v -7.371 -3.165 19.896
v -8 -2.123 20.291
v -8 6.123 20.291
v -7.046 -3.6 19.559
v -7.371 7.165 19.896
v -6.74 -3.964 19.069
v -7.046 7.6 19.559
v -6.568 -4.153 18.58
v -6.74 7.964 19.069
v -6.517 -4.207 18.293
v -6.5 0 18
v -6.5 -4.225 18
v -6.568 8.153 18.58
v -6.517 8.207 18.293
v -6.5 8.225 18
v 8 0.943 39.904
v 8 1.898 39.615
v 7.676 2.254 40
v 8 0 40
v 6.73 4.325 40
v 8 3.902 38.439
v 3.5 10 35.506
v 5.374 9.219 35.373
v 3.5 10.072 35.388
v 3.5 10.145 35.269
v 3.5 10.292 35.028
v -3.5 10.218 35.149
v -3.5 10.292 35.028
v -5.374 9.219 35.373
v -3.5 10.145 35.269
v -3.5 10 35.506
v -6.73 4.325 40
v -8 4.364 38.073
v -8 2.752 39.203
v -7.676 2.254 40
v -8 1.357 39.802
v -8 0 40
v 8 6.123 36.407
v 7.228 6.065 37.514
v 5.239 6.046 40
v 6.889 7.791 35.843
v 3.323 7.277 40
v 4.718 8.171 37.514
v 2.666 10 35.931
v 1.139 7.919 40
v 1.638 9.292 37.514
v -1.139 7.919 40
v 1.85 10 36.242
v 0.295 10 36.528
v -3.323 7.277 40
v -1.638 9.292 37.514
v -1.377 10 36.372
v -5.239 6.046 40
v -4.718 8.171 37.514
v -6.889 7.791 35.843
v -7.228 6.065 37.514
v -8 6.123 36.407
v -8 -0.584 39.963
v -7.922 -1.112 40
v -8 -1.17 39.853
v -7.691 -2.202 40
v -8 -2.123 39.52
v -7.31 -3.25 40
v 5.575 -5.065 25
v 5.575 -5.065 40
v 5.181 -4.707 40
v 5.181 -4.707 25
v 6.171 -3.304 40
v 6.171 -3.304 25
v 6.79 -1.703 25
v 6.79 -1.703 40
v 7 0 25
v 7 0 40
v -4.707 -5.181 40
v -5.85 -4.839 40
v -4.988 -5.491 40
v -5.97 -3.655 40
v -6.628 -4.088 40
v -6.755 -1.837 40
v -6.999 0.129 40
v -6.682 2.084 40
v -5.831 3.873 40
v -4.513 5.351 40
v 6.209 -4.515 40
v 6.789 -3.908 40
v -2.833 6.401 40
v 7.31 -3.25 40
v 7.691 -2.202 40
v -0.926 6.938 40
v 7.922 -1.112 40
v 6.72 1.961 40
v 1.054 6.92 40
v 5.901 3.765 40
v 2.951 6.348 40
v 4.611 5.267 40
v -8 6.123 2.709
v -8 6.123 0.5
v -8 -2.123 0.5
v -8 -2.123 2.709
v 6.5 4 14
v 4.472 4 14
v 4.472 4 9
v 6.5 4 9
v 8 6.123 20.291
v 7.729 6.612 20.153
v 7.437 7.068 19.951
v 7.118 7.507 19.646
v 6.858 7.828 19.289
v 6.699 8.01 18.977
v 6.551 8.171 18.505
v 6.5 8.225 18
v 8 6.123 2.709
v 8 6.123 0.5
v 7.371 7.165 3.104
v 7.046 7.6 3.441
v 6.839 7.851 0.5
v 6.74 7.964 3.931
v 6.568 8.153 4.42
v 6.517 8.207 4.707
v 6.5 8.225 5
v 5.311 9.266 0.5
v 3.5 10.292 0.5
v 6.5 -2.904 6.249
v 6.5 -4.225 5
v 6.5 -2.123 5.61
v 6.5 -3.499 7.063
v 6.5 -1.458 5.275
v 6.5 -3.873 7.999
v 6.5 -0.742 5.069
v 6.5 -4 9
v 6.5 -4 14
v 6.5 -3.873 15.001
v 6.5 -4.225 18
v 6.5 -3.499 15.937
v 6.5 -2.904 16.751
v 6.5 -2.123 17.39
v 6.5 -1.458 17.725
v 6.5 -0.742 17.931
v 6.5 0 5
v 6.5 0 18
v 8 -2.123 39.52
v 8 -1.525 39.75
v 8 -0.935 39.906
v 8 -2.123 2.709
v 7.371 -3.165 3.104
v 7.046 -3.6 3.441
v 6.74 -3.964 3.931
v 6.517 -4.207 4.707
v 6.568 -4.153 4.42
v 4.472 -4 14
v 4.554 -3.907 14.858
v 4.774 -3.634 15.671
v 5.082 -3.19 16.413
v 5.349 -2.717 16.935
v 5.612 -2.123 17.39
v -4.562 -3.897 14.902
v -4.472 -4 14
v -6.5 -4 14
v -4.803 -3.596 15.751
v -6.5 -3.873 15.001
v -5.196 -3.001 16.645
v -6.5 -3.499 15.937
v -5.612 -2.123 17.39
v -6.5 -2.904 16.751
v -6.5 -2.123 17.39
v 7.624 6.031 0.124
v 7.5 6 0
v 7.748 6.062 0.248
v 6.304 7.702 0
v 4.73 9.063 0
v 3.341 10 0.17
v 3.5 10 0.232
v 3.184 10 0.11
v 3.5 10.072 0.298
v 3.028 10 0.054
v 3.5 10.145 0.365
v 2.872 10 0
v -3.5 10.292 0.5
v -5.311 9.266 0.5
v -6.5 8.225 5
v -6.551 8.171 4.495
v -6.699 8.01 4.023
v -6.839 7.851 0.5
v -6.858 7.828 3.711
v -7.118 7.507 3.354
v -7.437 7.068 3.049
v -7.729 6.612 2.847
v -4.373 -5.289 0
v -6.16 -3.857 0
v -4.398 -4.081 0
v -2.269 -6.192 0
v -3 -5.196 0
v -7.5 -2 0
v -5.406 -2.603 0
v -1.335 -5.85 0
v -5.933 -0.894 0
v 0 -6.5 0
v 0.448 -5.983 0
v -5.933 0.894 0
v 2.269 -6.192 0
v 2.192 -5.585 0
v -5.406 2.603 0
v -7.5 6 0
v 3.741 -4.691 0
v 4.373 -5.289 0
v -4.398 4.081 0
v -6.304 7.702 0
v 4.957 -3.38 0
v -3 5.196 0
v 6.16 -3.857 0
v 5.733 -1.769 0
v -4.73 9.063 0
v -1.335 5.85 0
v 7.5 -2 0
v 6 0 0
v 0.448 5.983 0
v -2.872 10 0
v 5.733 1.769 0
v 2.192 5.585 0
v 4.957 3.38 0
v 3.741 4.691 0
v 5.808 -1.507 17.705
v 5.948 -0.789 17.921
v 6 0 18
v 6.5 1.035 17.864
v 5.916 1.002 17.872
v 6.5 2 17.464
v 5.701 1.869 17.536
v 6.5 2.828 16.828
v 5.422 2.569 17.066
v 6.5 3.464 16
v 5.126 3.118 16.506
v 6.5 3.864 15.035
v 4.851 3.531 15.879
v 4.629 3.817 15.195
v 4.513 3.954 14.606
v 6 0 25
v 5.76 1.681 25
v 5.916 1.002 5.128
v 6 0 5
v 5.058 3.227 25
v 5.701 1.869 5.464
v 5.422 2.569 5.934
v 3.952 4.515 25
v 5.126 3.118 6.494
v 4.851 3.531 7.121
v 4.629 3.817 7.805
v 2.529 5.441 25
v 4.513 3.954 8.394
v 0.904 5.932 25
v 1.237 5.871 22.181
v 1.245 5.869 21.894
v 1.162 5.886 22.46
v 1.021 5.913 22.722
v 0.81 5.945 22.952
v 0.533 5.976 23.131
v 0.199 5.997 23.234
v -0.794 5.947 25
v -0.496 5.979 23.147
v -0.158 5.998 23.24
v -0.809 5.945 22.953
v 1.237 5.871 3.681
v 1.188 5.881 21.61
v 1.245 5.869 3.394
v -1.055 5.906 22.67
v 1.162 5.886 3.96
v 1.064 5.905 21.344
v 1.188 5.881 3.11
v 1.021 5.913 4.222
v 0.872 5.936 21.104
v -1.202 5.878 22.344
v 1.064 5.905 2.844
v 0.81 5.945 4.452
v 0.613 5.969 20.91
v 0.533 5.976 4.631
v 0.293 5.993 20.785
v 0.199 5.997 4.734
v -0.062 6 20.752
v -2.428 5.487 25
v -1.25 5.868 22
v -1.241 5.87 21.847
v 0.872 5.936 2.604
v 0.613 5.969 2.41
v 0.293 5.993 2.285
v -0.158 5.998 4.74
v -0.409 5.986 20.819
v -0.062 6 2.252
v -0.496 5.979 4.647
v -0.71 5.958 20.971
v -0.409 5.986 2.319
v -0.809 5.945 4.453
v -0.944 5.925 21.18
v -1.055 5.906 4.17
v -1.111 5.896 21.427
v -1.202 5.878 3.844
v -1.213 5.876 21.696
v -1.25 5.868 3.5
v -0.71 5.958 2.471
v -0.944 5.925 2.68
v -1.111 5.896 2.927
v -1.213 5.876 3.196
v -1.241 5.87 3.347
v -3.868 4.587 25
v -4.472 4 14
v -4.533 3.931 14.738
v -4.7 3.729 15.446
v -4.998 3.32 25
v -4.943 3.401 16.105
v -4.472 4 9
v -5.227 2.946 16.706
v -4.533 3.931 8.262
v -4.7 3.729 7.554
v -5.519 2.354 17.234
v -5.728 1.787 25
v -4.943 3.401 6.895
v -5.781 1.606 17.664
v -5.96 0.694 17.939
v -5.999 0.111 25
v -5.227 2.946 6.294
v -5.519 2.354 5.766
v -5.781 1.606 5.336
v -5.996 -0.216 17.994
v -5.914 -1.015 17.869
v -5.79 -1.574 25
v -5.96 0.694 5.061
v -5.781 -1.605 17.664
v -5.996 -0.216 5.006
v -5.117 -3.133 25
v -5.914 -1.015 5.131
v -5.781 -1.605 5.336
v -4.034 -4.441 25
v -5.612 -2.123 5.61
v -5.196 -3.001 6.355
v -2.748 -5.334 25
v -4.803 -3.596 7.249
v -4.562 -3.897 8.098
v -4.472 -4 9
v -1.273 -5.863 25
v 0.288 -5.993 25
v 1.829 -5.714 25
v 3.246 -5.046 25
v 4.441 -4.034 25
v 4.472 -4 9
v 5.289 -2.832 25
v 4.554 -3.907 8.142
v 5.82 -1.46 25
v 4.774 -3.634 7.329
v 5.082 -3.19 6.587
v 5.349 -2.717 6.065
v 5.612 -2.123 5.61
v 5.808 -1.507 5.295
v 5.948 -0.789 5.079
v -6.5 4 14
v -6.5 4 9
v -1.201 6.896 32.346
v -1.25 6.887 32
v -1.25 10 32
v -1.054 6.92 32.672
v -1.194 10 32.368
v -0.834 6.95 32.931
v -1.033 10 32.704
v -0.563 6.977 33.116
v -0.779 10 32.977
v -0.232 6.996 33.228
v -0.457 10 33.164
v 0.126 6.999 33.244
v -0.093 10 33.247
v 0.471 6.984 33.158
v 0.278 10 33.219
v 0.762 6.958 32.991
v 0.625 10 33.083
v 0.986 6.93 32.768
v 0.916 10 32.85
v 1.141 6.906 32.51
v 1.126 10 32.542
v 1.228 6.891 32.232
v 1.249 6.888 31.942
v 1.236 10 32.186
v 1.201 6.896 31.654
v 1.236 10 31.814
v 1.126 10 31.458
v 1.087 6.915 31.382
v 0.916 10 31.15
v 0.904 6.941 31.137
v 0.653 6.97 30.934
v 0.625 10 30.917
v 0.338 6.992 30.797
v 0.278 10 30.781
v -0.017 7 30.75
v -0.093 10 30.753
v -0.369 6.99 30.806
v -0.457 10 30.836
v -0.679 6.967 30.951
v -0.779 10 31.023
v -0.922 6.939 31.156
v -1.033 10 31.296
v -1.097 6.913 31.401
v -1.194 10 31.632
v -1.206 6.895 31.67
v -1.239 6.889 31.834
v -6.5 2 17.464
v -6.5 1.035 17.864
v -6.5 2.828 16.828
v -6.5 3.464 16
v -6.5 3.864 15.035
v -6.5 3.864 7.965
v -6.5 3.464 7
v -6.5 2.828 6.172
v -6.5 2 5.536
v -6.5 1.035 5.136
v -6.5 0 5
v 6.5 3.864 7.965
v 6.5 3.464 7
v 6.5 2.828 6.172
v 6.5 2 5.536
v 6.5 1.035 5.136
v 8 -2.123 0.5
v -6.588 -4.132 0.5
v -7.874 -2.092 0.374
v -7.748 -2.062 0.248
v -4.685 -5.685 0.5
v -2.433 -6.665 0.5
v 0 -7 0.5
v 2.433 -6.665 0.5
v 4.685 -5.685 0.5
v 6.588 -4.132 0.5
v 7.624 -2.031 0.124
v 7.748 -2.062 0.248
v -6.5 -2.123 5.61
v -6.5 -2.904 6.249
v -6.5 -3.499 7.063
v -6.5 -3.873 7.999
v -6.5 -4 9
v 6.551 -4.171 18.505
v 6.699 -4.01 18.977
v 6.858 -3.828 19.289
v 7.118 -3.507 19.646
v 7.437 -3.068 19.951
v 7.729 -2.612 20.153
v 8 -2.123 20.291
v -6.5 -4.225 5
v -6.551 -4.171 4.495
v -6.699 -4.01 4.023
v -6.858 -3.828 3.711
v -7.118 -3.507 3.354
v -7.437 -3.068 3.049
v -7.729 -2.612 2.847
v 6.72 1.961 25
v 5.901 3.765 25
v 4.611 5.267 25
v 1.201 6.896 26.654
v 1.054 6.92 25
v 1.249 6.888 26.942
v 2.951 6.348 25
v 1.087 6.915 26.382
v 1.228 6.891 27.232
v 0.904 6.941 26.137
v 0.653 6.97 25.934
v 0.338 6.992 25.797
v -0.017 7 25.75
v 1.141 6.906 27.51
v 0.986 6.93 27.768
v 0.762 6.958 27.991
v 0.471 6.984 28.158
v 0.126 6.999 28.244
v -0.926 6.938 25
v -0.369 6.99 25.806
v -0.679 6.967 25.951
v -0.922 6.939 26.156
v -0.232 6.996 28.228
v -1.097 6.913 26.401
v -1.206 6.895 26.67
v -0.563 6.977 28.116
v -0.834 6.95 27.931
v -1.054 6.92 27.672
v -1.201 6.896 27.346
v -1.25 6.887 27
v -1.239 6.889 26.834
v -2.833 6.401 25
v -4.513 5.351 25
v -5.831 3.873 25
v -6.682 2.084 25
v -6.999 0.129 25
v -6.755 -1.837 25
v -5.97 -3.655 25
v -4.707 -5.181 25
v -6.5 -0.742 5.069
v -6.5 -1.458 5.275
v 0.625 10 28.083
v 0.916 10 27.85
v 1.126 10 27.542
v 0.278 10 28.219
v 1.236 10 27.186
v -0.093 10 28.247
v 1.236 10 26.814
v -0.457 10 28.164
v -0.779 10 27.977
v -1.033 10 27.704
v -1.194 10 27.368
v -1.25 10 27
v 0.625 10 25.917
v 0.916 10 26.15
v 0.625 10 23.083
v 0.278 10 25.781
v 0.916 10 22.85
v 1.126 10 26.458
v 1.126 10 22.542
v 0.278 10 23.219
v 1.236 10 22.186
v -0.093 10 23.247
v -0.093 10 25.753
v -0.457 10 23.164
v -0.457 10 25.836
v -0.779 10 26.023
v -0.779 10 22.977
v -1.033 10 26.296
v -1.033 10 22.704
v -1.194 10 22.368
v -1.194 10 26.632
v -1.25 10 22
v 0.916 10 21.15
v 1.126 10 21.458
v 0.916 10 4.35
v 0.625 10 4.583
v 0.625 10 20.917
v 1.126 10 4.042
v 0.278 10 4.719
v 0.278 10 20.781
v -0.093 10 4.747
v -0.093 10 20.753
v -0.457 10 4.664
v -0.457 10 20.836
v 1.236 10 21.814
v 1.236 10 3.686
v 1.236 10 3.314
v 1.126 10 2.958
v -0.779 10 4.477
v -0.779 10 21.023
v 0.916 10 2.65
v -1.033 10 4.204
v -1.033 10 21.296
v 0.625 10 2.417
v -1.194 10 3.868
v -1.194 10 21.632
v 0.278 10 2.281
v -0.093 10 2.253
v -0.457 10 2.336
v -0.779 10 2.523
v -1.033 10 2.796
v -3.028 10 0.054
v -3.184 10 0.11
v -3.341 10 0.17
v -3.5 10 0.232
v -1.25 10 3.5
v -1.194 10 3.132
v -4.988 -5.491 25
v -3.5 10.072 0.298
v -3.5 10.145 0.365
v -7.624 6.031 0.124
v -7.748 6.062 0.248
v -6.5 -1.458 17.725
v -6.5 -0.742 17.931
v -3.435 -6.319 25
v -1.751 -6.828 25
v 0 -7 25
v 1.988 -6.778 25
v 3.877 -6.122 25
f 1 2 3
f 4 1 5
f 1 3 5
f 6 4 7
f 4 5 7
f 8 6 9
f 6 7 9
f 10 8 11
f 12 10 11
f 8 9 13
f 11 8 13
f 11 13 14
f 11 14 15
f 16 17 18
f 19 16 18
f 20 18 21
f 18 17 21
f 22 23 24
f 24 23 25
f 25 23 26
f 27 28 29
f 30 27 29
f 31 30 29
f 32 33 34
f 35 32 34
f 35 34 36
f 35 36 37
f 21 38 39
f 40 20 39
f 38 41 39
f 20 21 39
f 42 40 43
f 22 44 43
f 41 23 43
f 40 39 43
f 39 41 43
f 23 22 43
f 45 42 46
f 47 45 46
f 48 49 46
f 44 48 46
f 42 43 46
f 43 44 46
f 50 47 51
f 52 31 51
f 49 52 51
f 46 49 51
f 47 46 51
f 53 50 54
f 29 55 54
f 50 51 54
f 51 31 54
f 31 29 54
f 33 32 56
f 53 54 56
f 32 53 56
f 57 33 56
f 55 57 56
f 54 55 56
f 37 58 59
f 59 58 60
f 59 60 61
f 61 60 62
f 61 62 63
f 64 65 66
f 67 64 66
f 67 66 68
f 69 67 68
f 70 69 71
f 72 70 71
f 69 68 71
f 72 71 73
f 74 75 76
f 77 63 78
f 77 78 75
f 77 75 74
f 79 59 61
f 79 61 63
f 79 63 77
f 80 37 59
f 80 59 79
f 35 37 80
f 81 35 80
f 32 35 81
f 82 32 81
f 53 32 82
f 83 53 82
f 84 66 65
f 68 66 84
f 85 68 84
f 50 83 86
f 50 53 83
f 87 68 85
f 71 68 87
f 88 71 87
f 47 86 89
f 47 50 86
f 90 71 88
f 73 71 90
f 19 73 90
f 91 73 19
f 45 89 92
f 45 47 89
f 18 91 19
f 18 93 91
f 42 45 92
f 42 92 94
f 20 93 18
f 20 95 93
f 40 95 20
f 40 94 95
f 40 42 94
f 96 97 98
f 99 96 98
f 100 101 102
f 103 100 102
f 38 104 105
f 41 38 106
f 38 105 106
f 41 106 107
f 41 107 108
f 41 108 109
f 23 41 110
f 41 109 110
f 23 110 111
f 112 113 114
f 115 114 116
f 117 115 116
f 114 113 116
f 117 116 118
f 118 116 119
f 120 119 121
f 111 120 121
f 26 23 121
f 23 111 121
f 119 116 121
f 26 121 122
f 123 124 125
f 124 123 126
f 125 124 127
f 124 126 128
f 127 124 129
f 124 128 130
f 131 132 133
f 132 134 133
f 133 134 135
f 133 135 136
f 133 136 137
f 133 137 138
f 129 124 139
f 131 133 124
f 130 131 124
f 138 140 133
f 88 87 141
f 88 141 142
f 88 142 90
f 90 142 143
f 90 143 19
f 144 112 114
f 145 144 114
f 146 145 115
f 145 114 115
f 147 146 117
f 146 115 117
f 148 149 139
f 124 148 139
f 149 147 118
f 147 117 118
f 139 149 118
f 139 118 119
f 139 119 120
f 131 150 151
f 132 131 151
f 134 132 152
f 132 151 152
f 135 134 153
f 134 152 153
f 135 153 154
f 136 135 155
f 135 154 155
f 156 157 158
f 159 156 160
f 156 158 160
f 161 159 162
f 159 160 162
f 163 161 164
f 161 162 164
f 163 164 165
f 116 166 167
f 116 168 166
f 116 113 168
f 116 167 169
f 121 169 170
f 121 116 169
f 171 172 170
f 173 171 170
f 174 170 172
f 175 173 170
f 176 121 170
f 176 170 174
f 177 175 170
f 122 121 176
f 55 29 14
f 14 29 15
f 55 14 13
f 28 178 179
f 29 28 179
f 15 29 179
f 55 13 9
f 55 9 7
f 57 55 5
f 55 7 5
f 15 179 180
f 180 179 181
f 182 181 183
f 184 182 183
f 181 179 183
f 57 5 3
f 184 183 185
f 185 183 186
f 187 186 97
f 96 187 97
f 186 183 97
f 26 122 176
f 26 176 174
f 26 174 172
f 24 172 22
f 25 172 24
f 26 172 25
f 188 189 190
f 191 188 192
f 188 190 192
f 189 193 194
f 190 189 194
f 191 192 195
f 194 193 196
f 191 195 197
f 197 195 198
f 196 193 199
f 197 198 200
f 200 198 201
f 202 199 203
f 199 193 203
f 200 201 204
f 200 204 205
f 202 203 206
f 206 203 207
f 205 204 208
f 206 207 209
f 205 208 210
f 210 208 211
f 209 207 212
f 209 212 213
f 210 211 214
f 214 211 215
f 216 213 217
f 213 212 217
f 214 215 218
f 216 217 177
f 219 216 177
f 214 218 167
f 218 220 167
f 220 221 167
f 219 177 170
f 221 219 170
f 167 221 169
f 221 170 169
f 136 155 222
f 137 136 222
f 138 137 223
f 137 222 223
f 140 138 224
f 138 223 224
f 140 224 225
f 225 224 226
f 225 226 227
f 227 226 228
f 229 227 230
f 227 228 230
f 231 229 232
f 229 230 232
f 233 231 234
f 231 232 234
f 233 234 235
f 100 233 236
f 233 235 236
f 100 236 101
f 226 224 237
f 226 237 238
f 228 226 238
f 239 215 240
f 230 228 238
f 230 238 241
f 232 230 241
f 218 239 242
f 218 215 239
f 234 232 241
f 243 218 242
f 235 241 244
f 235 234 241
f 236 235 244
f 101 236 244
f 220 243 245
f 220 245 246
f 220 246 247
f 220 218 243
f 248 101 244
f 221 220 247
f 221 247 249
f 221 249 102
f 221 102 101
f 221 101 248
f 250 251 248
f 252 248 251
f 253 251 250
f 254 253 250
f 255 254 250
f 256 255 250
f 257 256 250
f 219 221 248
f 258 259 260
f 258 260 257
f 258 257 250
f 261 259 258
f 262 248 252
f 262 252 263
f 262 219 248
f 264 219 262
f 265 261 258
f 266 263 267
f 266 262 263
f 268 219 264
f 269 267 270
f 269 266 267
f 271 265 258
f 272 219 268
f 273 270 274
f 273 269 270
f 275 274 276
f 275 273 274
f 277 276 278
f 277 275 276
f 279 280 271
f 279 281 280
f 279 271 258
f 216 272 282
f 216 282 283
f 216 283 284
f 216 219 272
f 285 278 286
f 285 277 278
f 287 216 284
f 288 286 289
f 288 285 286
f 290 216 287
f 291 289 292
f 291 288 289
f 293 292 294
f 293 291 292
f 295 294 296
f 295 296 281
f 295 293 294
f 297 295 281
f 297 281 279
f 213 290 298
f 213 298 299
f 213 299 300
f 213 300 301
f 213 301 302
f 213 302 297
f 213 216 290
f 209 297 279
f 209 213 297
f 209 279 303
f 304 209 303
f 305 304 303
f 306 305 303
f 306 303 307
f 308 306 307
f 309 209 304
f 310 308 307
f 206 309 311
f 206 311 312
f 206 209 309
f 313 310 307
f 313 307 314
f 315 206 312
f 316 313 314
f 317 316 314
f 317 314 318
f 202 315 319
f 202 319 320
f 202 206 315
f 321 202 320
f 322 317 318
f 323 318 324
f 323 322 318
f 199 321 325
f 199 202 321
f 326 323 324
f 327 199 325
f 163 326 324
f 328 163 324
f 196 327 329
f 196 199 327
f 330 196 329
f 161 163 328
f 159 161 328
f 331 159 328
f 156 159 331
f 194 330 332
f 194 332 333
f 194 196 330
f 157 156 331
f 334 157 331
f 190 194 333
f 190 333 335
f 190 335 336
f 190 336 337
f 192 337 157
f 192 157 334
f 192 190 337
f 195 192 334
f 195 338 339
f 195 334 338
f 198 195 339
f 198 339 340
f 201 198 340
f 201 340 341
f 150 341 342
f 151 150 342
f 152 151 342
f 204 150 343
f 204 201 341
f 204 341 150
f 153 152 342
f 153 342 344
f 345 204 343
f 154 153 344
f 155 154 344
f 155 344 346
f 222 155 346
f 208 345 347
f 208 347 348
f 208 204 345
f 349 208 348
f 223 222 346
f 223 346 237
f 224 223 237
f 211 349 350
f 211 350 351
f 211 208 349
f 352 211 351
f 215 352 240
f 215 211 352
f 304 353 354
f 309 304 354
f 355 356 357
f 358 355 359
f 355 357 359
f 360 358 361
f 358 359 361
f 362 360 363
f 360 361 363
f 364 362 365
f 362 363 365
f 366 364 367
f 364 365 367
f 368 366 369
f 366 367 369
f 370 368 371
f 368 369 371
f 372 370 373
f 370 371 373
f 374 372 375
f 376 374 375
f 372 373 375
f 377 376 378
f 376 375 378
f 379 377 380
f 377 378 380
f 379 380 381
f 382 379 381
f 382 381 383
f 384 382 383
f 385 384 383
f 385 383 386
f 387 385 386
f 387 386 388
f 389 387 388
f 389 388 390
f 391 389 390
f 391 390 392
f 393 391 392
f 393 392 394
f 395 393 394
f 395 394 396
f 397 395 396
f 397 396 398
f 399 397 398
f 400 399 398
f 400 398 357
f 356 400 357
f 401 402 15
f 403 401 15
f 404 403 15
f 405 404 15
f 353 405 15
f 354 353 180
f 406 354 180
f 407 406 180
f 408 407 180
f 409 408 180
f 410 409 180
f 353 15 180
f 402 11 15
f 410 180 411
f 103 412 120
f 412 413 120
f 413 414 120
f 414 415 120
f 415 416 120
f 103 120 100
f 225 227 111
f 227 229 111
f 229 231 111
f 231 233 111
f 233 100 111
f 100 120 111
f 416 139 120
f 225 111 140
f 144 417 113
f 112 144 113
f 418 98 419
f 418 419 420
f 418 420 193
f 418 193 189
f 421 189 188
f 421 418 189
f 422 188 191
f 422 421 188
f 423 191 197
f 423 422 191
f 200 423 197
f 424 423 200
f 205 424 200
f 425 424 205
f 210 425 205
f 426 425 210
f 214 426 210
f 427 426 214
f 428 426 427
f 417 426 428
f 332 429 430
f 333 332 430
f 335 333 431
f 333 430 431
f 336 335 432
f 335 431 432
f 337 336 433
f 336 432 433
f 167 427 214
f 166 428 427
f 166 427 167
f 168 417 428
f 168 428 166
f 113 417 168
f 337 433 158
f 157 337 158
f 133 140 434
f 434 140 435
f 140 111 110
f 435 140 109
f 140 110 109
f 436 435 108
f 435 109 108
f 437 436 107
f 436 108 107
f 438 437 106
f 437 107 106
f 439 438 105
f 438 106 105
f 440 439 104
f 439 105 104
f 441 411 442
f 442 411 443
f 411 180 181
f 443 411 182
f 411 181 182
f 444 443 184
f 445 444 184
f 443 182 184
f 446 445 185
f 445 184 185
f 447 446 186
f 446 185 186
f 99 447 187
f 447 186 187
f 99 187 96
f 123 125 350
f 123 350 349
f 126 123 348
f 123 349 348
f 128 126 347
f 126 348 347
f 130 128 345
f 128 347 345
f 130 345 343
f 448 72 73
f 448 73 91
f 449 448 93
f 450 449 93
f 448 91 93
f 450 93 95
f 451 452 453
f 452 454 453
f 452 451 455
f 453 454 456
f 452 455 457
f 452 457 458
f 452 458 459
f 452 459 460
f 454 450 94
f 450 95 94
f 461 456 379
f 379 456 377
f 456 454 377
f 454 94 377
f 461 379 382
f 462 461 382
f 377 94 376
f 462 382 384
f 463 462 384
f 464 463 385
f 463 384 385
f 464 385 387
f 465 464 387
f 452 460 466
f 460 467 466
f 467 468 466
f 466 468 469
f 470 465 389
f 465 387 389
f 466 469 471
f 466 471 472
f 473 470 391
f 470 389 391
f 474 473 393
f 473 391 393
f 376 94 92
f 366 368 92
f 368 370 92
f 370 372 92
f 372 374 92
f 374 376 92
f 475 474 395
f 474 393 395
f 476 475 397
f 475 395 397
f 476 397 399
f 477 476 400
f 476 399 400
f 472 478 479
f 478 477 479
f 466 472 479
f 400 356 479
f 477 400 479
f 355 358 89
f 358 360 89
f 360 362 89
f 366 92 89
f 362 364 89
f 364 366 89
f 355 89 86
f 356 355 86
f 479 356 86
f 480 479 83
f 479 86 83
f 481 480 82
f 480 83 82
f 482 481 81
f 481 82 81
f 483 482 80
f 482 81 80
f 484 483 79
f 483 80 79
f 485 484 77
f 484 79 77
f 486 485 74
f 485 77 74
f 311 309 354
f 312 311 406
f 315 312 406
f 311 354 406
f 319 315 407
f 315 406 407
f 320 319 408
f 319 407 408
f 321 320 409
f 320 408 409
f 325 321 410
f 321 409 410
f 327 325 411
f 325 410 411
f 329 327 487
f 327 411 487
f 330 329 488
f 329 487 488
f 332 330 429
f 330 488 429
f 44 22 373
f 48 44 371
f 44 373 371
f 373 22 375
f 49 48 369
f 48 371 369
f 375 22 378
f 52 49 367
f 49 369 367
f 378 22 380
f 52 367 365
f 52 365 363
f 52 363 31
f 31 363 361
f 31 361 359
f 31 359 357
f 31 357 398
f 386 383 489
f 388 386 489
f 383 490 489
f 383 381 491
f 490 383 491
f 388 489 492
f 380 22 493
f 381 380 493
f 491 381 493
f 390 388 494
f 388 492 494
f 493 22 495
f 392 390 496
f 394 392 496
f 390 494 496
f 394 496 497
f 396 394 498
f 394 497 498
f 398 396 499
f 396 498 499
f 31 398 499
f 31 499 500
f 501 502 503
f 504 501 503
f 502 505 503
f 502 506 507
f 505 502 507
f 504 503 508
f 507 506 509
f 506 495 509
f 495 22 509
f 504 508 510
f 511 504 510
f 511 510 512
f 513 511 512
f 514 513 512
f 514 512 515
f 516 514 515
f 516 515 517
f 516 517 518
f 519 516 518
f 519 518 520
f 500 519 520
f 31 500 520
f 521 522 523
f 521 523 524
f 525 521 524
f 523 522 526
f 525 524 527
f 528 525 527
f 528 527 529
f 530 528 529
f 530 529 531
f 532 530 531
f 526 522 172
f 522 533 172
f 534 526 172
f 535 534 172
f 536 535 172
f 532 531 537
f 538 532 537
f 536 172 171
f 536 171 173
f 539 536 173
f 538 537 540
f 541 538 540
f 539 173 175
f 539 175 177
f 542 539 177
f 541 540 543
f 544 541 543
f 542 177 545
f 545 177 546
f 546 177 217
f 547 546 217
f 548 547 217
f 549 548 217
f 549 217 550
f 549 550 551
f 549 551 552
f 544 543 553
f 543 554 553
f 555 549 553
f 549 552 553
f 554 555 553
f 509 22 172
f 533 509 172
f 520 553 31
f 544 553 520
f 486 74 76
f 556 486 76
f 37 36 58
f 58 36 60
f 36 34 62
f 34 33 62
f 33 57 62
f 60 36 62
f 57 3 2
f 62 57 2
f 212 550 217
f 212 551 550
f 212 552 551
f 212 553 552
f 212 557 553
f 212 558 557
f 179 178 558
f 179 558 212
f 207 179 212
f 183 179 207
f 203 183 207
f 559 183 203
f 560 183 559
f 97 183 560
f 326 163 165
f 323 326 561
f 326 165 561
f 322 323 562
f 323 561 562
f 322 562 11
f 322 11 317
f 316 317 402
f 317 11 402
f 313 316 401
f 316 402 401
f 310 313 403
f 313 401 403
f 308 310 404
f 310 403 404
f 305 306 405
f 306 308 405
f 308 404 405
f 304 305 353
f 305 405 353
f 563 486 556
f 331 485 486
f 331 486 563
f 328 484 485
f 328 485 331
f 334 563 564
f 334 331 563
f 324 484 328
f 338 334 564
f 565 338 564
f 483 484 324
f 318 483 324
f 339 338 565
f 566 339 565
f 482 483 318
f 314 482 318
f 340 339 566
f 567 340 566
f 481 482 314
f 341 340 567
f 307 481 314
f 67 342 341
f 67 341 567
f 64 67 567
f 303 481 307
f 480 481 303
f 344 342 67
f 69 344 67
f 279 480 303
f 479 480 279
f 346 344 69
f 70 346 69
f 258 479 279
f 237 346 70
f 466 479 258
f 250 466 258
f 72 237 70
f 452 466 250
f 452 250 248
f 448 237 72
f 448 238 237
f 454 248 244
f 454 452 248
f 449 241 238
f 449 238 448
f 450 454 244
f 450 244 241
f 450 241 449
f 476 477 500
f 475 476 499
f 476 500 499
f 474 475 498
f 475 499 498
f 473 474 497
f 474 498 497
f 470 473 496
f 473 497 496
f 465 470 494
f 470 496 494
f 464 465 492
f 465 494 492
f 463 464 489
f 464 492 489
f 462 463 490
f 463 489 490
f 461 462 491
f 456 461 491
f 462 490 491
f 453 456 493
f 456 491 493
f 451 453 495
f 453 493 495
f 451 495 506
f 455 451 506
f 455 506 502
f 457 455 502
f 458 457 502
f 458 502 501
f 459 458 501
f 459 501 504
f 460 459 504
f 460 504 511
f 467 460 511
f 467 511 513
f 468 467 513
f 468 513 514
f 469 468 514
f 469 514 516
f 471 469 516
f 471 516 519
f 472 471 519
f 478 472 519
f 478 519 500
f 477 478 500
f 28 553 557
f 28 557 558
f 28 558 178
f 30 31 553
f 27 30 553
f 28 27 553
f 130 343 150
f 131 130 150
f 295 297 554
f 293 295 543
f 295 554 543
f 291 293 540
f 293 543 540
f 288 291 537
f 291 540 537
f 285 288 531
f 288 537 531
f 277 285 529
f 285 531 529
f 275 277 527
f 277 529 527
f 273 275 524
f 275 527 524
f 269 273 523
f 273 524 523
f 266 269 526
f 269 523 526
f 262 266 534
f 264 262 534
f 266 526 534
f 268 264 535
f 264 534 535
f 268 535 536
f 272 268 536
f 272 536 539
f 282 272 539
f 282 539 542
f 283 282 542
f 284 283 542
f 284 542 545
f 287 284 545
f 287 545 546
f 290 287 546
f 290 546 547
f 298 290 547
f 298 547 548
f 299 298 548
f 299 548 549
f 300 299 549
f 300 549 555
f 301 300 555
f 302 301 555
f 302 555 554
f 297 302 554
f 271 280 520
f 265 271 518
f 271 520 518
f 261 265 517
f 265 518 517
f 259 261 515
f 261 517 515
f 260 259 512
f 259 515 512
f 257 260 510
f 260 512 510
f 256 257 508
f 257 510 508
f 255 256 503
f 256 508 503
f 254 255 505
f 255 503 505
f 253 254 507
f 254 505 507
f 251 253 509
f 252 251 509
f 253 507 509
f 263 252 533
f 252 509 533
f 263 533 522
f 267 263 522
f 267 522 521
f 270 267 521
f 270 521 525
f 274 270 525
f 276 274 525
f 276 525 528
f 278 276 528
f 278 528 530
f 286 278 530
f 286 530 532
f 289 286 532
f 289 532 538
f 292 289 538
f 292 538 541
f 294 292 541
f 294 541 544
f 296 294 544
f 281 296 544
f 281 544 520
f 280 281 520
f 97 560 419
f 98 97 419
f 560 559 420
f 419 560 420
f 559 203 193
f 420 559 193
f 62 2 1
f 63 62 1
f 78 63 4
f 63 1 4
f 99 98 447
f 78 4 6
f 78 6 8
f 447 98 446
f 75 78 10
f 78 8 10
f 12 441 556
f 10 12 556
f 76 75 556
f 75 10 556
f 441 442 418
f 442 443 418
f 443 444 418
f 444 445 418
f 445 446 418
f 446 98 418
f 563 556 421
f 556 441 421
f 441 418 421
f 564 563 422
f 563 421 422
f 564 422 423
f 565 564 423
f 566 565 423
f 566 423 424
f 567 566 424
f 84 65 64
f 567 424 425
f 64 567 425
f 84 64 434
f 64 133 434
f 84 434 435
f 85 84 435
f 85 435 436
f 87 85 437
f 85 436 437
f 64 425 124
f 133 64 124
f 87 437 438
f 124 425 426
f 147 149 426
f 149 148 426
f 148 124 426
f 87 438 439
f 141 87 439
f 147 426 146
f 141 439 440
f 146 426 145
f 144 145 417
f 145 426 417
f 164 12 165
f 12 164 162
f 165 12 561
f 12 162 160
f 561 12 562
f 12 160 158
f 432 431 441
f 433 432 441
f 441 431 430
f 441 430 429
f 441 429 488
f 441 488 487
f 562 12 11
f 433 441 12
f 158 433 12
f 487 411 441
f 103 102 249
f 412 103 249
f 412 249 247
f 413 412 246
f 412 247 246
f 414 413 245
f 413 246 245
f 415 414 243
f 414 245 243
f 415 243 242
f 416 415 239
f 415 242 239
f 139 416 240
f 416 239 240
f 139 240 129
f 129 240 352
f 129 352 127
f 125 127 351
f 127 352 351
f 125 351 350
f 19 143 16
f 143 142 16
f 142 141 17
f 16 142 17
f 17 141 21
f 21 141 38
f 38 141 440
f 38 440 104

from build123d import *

# Parameters (mm, degrees)
F0_R      = 6
F1_DEPTH  = 40
F3_DEPTH  = 15
F6_SIZE   = 0.5
F8_DEPTH  = 16.0010001
F9_R      = 1.25
F10_DEPTH = 4.1326528028
F11_DEPTH = 15


# Not quite as in the source:
# - a feature names something its author has since deleted; it is built from what else it names


with BuildPart() as f1:
    # F0 (on Top) → F1 (new body)
    with BuildSketch(Plane.XY):
        with BuildLine():
            Line((-8, 6.1231056256), (-8, -2.1231056256))
            ThreePointArc((-8, -2.1231056256), (0, -7), (8, -2.1231056256))
            Line((8, -2.1231056256), (8, 6.1231056256))
            ThreePointArc((8, 6.1231056256), (6.1160859286, 8.6025368544), (3.5, 10.2915619759))
            Line((3.5, 10.2915619759), (3.5, 10))
            Line((3.5, 10), (-3.5, 10))
            Line((-3.5, 10), (-3.5, 10.2915619759))
            ThreePointArc((-3.5, 10.2915619759), (-6.1160859286, 8.6025368544), (-8, 6.1231056256))
        make_face()
        Circle(F0_R, mode=Mode.SUBTRACT)
    extrude(amount=F1_DEPTH)

    # F2 (on face) → F3 (cut)
    with BuildSketch(Plane.XY.offset(40)):
        with BuildLine():
            ThreePointArc((5.1812656518, -4.7068552395), (6.5295045586, -2.5230081686), (7, 0))
            ThreePointArc((7, 0), (-2.8330207662, 6.4010931362), (-4.7068552395, -5.1812656518))
            Line((-4.7068552395, -5.1812656518), (-4.0344473482, -4.4410848444))
            ThreePointArc((-4.0344473482, -4.4410848444), (-2.4283035139, 5.4866512596), (6, 0))
            ThreePointArc((6, 0), (5.5967181931, -2.1625784302), (4.4410848444, -4.0344473482))
            Line((4.4410848444, -4.0344473482), (5.1812656518, -4.7068552395))
        make_face()
        with BuildLine():
            Line((-4.0344473482, -4.4410848444), (-4.7068552395, -5.1812656518))
            ThreePointArc((-4.7068552395, -5.1812656518), (-2.523008134, -6.529504572), (7.42e-08, -7))
            ThreePointArc((7.42e-08, -7), (2.8330208001, -6.4010931212), (5.1812656518, -4.7068552395))
            Line((5.1812656518, -4.7068552395), (4.4410848444, -4.0344473482))
            ThreePointArc((4.4410848444, -4.0344473482), (0.2875361311, -5.9931062875), (-4.0344473482, -4.4410848444))
        make_face()
        with BuildLine():
            ThreePointArc((7.42e-08, -7), (-2.523008134, -6.529504572), (-4.7068552395, -5.1812656518))
            Line((-4.7068552395, -5.1812656518), (-4.9883233954, -5.4911033702))
            ThreePointArc((-4.9883233954, -5.4911033702), (-2.6057694927, -6.6145206106), (7.42e-08, -7))
        make_face()
        with BuildLine():
            Line((5.5754867215, -5.0649803835), (5.1812656518, -4.7068552395))
            ThreePointArc((5.1812656518, -4.7068552395), (2.8330208001, -6.4010931212), (7.42e-08, -7))
            ThreePointArc((7.42e-08, -7), (2.9508623284, -6.5024944292), (5.5754867215, -5.0649803835))
        make_face()
    extrude(amount=-F3_DEPTH, mode=Mode.SUBTRACT)

    # F4 (on Front) → F5 (revolve, cut)
    with BuildSketch(Plane.XZ):
        Polygon((0, 44.0566428006), (8, 40), (14.6664504582, 28.4533691002), (14.6664504582, 47.2484640777), (0, 47.2484640777), align=None)
    revolve(axis=Axis((0, 0, 27), (0, 0, 1)), mode=Mode.SUBTRACT)

    # F6
    f6_edges = [f1.edges().sort_by_distance(p)[0] for p in [
        (6.116086, 8.602537, 0),
        (-6.116086, 8.602537, 0),
        (-8, 2, 0),
        (0, -7, 0),
        (8, 2, 0),
    ]]
    chamfer(f6_edges, length=F6_SIZE)

    # F7 (on face) → F8 (cut, through all)
    with BuildSketch(Plane(origin=(-8, 0, 0), x_dir=(0, -1, 0), z_dir=(-1, 0, 0))):
        with BuildLine():
            ThreePointArc((2.1231056256, 5.6099524336), (3.4994587083, 7.0625303231), (4, 9))
            ThreePointArc((4, 9), (3.7742546282, 10.3247648854), (3.1224989992, 11.5))
            ThreePointArc((3.1224989992, 11.5), (2.6602891079, 11.0128840226), (2.1231056256, 10.6099524336))
            Line((2.1231056256, 10.6099524336), (2.1231056256, 5.6099524336))
        make_face()
        with BuildLine():
            ThreePointArc((3.1224989992, 11.5), (3.7742546282, 10.3247648854), (4, 9))
            Line((4, 9), (4, 14))
            ThreePointArc((4, 14), (3.7742546282, 12.6752351146), (3.1224989992, 11.5))
        make_face()
        with BuildLine():
            ThreePointArc((2.1231056256, 10.6099524336), (2.6602891079, 11.0128840226), (3.1224989992, 11.5))
            ThreePointArc((3.1224989992, 11.5), (2.6602891079, 11.9871159774), (2.1231056256, 12.3900475664))
            Line((2.1231056256, 12.3900475664), (2.1231056256, 10.6099524336))
        make_face()
        with BuildLine():
            ThreePointArc((2.1231056256, 12.3900475664), (2.6602891079, 11.9871159774), (3.1224989992, 11.5))
            ThreePointArc((3.1224989992, 11.5), (3.7742546282, 12.6752351146), (4, 14))
            ThreePointArc((4, 14), (3.4994587083, 15.9374696769), (2.1231056256, 17.3900475664))
            Line((2.1231056256, 17.3900475664), (2.1231056256, 12.3900475664))
        make_face()
        with BuildLine():
            ThreePointArc((-4, 9), (-1.9374696769, 5.5005412917), (2.1231056256, 5.6099524336))
            Line((2.1231056256, 5.6099524336), (2.1231056256, 10.6099524336))
            ThreePointArc((2.1231056256, 10.6099524336), (-0.66913597, 10.0563649949), (-3.1224989992, 11.5))
            ThreePointArc((-3.1224989992, 11.5), (-3.7742546282, 10.3247648854), (-4, 9))
        make_face()
        with BuildLine():
            Line((2.1231056256, 10.6099524336), (2.1231056256, 12.3900475664))
            ThreePointArc((2.1231056256, 12.3900475664), (-0.66913597, 12.9436350051), (-3.1224989992, 11.5))
            ThreePointArc((-3.1224989992, 11.5), (-0.66913597, 10.0563649949), (2.1231056256, 10.6099524336))
        make_face()
        with BuildLine():
            ThreePointArc((-3.1224989992, 11.5), (-0.66913597, 12.9436350051), (2.1231056256, 12.3900475664))
            Line((2.1231056256, 12.3900475664), (2.1231056256, 17.3900475664))
            ThreePointArc((2.1231056256, 17.3900475664), (-1.9374696769, 17.4994587083), (-4, 14))
            ThreePointArc((-4, 14), (-3.7742546282, 12.6752351146), (-3.1224989992, 11.5))
        make_face()
        with BuildLine():
            Line((-4, 14), (-4, 9))
            ThreePointArc((-4, 9), (-3.7742546282, 10.3247648854), (-3.1224989992, 11.5))
            ThreePointArc((-3.1224989992, 11.5), (-3.7742546282, 12.6752351146), (-4, 14))
        make_face()
    extrude(amount=-F8_DEPTH, mode=Mode.SUBTRACT)

    # F9 (on face) → F10 (cut, through all)
    with BuildSketch(Plane(origin=(0, 10, 0), x_dir=(-1, 0, 0), z_dir=(0, 1, 0))):
        with Locations((0, 3.5)):
            Circle(F9_R)
        with Locations((0, 22)):
            Circle(F9_R)
        with Locations((0, 27)):
            Circle(F9_R)
        with Locations((0, 32)):
            Circle(F9_R)
    extrude(amount=-F10_DEPTH, mode=Mode.SUBTRACT)

    # F9 (on face) → F11 (cut)
    with BuildSketch(Plane(origin=(0, 10, 0), x_dir=(-1, 0, 0), z_dir=(0, 1, 0))):
        with BuildLine():
            ThreePointArc((-6.5, 18), (-7.232233047, 19.767766953), (-9, 20.5))
            Line((-9, 20.5), (-9.5, 20.5))
            Line((-9.5, 20.5), (-9.5, 2.5))
            Line((-9.5, 2.5), (-9, 2.5))
            ThreePointArc((-9, 2.5), (-7.232233047, 3.232233047), (-6.5, 5))
            Line((-6.5, 5), (-6.5, 18))
        make_face()
        with BuildLine():
            Line((10.5, 20.5), (9, 20.5))
            ThreePointArc((9, 20.5), (7.232233047, 19.767766953), (6.5, 18))
            Line((6.5, 18), (6.5, 5))
            ThreePointArc((6.5, 5), (7.232233047, 3.232233047), (9, 2.5))
            Line((9, 2.5), (10.5, 2.5))
            Line((10.5, 2.5), (10.5, 20.5))
        make_face()
    extrude(amount=-F11_DEPTH, mode=Mode.SUBTRACT)


solid = f1.part
